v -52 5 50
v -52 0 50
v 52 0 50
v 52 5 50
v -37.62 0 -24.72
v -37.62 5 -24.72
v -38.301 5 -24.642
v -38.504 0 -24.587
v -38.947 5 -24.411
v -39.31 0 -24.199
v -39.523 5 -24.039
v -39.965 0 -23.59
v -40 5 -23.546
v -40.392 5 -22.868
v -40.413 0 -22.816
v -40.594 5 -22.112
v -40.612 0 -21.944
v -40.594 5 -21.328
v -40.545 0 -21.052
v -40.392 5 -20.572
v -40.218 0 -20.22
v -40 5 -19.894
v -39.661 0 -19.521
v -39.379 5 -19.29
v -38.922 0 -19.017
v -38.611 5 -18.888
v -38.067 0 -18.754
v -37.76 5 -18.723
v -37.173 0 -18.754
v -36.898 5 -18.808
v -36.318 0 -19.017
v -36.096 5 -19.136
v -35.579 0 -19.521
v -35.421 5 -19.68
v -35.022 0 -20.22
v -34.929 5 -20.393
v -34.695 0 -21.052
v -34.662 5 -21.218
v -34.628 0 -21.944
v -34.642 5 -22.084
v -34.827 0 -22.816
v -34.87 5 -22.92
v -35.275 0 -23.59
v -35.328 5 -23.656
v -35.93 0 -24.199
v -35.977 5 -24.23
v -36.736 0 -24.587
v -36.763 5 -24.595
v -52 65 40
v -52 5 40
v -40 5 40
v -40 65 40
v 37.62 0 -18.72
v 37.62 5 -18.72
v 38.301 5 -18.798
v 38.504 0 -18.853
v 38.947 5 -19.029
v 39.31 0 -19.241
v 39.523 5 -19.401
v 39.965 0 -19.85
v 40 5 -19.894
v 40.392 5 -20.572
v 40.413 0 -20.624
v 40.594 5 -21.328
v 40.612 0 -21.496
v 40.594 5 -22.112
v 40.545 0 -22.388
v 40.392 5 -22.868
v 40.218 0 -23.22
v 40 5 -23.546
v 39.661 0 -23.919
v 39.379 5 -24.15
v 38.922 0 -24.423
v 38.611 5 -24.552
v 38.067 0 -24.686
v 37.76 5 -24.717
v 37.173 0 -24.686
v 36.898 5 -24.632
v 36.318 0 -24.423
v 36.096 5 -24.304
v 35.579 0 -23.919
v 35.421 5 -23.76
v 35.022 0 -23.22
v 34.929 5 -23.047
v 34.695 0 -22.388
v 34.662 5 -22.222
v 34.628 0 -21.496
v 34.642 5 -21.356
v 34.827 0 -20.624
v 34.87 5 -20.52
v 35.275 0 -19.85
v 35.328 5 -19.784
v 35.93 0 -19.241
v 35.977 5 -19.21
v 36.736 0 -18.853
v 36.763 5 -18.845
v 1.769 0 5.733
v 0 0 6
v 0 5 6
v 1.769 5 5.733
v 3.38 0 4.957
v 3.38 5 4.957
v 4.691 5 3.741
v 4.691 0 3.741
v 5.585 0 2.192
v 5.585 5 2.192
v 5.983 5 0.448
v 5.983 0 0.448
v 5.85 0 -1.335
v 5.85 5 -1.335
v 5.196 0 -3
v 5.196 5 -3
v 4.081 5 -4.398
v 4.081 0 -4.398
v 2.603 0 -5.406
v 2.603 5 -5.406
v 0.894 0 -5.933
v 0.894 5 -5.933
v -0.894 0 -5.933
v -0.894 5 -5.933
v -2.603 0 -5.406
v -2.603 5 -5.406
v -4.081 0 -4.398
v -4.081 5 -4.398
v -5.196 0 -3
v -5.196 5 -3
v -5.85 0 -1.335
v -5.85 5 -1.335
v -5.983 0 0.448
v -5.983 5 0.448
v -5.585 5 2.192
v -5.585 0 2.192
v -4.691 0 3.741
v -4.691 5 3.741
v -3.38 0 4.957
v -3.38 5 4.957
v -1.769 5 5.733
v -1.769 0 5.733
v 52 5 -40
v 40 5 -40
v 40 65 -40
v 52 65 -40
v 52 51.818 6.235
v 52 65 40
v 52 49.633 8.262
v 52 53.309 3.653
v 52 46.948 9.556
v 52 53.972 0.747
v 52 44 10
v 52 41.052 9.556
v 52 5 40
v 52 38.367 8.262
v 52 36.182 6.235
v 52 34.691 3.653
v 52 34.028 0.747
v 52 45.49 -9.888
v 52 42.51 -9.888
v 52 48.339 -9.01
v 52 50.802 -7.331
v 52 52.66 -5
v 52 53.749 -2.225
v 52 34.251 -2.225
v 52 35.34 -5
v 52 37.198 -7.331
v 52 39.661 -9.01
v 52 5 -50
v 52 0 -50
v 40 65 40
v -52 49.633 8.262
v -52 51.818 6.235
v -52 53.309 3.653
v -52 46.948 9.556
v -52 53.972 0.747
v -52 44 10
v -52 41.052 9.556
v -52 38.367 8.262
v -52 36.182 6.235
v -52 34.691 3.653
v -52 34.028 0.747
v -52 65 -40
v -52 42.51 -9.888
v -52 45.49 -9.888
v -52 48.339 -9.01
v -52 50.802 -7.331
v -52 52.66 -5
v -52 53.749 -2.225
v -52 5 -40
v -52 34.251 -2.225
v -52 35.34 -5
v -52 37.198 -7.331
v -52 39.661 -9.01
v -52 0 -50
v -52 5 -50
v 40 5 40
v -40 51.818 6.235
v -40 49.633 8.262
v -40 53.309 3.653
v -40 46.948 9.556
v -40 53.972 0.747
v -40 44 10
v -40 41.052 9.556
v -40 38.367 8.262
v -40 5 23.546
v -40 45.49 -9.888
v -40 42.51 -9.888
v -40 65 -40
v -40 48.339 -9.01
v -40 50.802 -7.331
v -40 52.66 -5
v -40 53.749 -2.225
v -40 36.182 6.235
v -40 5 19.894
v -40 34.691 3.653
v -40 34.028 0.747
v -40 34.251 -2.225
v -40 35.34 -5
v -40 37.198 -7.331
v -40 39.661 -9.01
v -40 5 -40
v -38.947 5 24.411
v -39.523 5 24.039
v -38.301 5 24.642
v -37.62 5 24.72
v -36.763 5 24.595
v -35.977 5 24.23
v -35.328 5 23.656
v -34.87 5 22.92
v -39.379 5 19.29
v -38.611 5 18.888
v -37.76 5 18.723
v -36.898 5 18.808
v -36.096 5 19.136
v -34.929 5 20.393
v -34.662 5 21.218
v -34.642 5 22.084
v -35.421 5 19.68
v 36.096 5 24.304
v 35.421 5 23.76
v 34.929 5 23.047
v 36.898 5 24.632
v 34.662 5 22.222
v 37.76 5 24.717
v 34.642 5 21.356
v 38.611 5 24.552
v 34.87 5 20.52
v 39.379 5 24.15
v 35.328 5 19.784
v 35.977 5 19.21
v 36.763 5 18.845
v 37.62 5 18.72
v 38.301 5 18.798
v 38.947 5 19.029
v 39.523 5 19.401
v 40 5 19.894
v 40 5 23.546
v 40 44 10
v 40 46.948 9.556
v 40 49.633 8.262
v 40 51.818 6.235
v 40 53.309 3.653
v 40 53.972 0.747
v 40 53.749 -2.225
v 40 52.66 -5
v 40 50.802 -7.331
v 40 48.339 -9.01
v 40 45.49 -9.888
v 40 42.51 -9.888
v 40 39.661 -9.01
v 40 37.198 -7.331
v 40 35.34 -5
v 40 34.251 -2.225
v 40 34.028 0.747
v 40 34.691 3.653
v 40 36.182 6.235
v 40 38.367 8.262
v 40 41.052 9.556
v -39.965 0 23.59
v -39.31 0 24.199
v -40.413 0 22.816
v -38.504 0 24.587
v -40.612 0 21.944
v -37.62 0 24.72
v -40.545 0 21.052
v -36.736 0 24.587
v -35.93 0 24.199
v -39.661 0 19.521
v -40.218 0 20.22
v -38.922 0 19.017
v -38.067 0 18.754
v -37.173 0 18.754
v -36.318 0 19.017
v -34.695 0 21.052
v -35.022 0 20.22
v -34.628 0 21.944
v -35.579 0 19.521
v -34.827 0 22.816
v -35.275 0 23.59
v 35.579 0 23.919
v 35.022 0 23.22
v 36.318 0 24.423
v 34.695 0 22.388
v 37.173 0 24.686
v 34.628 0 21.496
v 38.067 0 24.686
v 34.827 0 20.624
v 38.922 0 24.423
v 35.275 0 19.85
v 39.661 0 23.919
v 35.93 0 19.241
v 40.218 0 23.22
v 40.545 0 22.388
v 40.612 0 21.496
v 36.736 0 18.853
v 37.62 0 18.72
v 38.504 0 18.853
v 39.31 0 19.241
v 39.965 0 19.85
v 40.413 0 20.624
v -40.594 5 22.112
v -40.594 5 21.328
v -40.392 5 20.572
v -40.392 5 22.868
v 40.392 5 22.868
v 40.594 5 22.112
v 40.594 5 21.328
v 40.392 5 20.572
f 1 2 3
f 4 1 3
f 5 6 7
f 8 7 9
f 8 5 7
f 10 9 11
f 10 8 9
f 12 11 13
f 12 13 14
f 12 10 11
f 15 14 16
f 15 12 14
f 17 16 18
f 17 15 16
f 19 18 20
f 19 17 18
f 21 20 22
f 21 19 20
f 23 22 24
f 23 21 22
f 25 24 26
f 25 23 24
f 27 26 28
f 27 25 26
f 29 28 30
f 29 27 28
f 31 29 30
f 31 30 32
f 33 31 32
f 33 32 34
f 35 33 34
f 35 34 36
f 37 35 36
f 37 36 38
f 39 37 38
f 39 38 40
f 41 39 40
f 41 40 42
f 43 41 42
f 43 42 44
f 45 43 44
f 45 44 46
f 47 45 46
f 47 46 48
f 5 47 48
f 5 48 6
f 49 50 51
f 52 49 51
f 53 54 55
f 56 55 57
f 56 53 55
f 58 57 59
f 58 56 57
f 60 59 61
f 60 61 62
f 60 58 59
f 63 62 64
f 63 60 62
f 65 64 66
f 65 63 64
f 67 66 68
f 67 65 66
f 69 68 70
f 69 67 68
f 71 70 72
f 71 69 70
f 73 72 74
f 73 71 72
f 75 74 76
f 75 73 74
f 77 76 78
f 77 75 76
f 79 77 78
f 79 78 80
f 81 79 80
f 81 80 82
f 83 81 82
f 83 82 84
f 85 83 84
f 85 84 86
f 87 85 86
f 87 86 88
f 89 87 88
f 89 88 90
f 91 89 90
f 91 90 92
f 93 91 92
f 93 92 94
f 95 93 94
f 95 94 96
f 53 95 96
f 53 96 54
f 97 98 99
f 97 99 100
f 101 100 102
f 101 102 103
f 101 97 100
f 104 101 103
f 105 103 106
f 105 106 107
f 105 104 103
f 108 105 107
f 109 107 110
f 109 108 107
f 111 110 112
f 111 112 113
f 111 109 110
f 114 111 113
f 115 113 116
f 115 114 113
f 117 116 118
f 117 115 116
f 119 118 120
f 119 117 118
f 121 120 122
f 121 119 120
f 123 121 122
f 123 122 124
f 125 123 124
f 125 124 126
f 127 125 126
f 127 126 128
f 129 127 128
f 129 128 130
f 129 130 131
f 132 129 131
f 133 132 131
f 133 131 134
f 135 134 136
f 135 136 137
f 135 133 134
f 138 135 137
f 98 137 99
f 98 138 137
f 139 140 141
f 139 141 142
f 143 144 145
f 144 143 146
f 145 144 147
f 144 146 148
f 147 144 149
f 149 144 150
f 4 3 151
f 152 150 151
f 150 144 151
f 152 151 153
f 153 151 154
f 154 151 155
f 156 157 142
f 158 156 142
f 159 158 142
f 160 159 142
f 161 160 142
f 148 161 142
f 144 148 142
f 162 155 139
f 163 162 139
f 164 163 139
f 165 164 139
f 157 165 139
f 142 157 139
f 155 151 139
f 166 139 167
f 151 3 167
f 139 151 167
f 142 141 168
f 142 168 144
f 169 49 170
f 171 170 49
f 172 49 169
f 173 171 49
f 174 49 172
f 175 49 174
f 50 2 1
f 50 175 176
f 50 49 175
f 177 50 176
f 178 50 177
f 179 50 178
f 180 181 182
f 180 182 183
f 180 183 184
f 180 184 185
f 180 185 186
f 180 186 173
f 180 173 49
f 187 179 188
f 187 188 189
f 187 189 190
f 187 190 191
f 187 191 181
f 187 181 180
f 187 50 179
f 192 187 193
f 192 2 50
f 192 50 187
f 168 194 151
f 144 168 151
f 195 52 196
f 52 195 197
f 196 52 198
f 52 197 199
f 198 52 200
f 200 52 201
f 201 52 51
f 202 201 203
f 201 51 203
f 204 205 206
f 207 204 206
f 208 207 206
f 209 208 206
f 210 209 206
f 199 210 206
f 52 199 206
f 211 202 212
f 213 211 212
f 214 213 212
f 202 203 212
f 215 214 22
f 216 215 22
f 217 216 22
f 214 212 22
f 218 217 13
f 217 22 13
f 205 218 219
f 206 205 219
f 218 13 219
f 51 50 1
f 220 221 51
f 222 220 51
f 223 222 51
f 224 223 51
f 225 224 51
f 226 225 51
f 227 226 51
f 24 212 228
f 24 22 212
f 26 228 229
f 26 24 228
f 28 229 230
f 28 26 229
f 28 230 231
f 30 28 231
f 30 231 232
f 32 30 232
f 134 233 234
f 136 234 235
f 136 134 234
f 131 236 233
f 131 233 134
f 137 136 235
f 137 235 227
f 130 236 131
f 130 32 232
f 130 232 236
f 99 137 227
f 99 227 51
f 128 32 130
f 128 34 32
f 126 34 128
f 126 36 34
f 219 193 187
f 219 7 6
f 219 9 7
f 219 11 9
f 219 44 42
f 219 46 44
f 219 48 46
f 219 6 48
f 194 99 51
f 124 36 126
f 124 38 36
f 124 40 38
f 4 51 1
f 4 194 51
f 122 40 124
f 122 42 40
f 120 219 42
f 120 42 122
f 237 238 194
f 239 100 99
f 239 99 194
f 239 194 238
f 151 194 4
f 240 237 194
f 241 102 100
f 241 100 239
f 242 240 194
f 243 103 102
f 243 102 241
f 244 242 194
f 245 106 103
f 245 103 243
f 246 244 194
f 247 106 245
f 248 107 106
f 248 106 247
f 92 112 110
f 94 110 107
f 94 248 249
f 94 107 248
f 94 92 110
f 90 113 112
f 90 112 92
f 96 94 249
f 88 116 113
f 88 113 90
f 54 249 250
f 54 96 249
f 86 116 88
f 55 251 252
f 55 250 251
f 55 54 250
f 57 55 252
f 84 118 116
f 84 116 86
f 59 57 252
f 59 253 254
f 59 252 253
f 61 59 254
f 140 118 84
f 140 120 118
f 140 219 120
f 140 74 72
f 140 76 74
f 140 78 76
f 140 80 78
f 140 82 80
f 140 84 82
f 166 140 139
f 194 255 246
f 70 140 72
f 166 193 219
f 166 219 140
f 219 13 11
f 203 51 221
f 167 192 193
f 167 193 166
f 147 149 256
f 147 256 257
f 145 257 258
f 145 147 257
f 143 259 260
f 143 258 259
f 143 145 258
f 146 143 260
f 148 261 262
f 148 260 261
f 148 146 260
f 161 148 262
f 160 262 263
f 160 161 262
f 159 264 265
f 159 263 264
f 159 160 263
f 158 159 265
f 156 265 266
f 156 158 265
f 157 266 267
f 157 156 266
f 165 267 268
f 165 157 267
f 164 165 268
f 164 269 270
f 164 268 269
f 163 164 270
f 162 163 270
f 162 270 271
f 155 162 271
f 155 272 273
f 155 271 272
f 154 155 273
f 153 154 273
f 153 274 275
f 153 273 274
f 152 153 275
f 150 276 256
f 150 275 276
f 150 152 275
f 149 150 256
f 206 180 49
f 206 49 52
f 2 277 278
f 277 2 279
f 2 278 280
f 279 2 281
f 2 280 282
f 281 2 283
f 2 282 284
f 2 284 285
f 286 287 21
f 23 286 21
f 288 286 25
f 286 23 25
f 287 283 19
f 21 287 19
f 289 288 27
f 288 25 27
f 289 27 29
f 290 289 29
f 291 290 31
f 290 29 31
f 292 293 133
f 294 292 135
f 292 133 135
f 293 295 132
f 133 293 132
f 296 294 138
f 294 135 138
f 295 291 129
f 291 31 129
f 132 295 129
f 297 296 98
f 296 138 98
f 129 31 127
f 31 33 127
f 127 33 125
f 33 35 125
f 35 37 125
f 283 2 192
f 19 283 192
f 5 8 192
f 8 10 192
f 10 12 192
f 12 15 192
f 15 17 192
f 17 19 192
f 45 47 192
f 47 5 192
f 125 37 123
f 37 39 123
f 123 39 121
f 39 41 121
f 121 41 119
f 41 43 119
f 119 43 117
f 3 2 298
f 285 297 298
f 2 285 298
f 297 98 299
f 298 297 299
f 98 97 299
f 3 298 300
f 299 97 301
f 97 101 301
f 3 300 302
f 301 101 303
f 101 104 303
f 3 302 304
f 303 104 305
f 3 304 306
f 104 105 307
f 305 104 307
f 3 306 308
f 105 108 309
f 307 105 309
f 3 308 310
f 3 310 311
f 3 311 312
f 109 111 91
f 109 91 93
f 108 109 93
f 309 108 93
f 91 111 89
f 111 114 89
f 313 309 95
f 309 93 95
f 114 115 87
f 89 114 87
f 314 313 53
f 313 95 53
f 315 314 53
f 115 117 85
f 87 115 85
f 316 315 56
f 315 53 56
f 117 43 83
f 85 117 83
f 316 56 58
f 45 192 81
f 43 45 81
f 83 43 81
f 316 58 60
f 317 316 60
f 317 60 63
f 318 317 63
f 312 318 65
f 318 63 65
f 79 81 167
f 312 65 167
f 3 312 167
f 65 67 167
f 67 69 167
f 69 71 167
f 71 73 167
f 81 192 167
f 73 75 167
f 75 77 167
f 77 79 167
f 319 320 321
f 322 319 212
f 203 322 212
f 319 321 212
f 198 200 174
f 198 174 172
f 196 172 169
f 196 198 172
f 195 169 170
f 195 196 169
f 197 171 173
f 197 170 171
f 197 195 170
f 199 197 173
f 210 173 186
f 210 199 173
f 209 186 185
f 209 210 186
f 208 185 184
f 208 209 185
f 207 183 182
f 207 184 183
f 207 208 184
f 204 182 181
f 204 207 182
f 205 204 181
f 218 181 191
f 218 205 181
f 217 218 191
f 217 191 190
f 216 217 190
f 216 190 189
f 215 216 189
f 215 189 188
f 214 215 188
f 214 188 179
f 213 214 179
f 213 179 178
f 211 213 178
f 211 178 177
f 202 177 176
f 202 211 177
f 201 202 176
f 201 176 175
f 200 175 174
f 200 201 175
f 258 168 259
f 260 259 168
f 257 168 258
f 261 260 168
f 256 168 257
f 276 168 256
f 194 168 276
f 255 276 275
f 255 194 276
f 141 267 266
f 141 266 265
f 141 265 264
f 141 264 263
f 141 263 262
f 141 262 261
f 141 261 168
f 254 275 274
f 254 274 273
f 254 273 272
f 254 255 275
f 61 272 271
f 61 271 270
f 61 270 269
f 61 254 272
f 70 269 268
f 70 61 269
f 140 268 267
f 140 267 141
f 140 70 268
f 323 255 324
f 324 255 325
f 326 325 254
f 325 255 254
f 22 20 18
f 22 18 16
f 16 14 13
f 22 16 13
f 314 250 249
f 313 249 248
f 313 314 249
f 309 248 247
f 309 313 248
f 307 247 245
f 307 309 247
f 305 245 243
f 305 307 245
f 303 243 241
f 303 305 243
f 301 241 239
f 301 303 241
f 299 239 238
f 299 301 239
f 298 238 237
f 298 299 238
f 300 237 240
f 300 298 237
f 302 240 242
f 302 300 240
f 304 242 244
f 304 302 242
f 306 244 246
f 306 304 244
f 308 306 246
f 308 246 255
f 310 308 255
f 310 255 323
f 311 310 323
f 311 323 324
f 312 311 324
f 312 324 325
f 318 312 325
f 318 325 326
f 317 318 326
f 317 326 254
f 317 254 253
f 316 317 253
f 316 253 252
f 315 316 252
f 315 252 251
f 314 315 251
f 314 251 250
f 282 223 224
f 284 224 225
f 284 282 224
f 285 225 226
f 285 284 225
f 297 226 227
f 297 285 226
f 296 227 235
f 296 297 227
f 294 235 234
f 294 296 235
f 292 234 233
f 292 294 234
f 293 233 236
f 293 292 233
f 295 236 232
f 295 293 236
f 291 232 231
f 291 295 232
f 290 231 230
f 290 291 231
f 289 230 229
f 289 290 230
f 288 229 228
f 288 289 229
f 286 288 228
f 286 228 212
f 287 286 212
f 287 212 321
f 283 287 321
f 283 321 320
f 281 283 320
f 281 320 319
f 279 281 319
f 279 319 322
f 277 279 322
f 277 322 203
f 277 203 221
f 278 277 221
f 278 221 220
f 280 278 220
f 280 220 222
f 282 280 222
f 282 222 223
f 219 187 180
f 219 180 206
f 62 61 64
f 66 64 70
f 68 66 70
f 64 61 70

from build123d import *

# Parameters (mm, degrees)
SKETCH1_W               = 104
SKETCH1_H               = 100
SKETCH1_R               = 3
SKETCH1_R_2             = 6
BOSS_EXTRUDE1_DEPTH     = 5
SKETCH2_W               = 12
SKETCH2_H               = 80
BOSS_EXTRUDE2_DEPTH     = 60
CUT_EXTRUDE1_DEPTH      = 133.442440328
CUT_EXTRUDE1_DEPTH_BACK = 133.442440328
SKETCH3_R               = 10


with BuildPart() as part:
    # Sketch1 → Boss-Extrude1 (new body)
    with BuildSketch(Plane(origin=(0, 0, 0), x_dir=(1, 0, 0), z_dir=(0, 1, 0))):
        Rectangle(SKETCH1_W, SKETCH1_H)
        with Locations(Location((-37.62, -21.72, 0), (0, 0, 270))):
            Circle(SKETCH1_R, mode=Mode.SUBTRACT)
        with Locations(Location((37.62, -21.72, 0), (0, 0, 90))):
            Circle(SKETCH1_R, mode=Mode.SUBTRACT)
        with Locations(Location((37.62, 21.72, 0), (0, 0, 270))):
            Circle(SKETCH1_R, mode=Mode.SUBTRACT)
        with Locations(Location((-37.62, 21.72, 0), (0, 0, 90))):
            Circle(SKETCH1_R, mode=Mode.SUBTRACT)
        with Locations(Location((0, 0, 0), (0, 0, 270))):
            Circle(SKETCH1_R_2, mode=Mode.SUBTRACT)
    extrude(amount=BOSS_EXTRUDE1_DEPTH)

    # Sketch2 → Boss-Extrude2 (add)
    with BuildSketch(Plane(origin=(0, 5, 0), x_dir=(1, 0, 0), z_dir=(0, 1, 0))):
        with Locations((-46, 0)):
            Rectangle(SKETCH2_W, SKETCH2_H)
        with Locations((46, 0)):
            Rectangle(SKETCH2_W, SKETCH2_H)
    extrude(amount=BOSS_EXTRUDE2_DEPTH)

    # Sketch3 → Cut-Extrude1 (cut, two sides: drawn at the far end of the back side and taken through both)
    with BuildSketch(Plane.ZY.offset(52).offset(-CUT_EXTRUDE1_DEPTH_BACK)):
        with Locations((0, 44)):
            Circle(SKETCH3_R)
    extrude(amount=CUT_EXTRUDE1_DEPTH + CUT_EXTRUDE1_DEPTH_BACK, mode=Mode.SUBTRACT)


solid = part.part
